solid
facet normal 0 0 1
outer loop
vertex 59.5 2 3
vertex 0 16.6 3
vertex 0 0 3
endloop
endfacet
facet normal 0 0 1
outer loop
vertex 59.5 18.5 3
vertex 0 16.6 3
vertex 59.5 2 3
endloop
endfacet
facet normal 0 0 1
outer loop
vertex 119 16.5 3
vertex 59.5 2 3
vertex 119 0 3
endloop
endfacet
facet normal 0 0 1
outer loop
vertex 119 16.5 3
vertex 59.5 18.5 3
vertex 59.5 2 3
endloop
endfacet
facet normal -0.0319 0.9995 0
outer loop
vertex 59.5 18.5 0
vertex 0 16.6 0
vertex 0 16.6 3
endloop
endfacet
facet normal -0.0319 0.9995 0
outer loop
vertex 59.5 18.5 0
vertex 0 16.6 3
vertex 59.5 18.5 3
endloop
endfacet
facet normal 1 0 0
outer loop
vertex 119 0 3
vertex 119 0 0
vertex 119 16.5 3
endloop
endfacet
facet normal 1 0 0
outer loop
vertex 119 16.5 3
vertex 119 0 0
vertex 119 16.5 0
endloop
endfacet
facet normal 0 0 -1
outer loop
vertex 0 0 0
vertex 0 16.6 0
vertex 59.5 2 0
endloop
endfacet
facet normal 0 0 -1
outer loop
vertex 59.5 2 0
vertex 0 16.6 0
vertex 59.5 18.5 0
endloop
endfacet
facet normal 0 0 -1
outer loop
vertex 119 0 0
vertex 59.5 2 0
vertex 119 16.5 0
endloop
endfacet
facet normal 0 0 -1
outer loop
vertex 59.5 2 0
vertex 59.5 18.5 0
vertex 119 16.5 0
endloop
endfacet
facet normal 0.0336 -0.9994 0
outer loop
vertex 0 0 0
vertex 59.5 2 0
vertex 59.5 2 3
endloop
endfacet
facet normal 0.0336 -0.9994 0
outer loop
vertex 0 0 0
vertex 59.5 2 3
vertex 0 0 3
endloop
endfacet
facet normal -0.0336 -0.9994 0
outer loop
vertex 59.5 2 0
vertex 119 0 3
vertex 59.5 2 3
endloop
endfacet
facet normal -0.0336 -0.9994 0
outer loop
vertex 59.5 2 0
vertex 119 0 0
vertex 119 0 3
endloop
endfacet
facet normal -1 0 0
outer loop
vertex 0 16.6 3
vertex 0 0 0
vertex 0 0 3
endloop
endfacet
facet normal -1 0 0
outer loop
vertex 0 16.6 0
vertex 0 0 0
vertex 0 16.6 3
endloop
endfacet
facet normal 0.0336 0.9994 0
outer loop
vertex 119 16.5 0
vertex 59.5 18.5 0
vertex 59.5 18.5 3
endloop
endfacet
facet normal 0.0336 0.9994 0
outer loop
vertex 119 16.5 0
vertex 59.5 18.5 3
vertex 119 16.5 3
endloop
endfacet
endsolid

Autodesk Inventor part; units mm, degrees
ref_plane "YZ Plane" through (0, 0, 0) normal (1, 0, 0) x (0, 1, 0)
ref_plane "XZ Plane" through (0, 0, 0) normal (0, 1, 0) x (-1, 0, 0)
ref_plane "XY Plane" through (0, 0, 0) normal (0, 0, 1) x (1, 0, 0)
sketch "Sketch1" plane through (0, 0, 0) normal (0, 0, 1) x (1, 0, 0)
  line L0 (0, 0) -> (119, 0)
  line L1 (0, 0) -> (0, 16.6)
  line L2 (0, 0) -> (59.5, 0)
  line L3 (59.5, 2) -> (59.5, 18.5)
  line L4 (0, 16.6) -> (59.5, 18.5)
  line L5 (59.5, 2) -> (0, 0)
  line L6 (119, 0) -> (119, 16.5)
  line L7 (59.5, 18.5) -> (119, 16.5)
  line L8 (119, 0) -> (59.5, 2)
  dimension "d0" = 119
  dimension "d1" = 16.6
  dimension "d2" = 59.5
  dimension "d3" = 2
  dimension "d4" = 16.5
  dimension "d5" = 16.5
extrude "Extrusion1" add sketch "Sketch1" along normal blind 3 contours L1 L4 L3 L5 | L3 L7 L6 L8
properties part number "E"
